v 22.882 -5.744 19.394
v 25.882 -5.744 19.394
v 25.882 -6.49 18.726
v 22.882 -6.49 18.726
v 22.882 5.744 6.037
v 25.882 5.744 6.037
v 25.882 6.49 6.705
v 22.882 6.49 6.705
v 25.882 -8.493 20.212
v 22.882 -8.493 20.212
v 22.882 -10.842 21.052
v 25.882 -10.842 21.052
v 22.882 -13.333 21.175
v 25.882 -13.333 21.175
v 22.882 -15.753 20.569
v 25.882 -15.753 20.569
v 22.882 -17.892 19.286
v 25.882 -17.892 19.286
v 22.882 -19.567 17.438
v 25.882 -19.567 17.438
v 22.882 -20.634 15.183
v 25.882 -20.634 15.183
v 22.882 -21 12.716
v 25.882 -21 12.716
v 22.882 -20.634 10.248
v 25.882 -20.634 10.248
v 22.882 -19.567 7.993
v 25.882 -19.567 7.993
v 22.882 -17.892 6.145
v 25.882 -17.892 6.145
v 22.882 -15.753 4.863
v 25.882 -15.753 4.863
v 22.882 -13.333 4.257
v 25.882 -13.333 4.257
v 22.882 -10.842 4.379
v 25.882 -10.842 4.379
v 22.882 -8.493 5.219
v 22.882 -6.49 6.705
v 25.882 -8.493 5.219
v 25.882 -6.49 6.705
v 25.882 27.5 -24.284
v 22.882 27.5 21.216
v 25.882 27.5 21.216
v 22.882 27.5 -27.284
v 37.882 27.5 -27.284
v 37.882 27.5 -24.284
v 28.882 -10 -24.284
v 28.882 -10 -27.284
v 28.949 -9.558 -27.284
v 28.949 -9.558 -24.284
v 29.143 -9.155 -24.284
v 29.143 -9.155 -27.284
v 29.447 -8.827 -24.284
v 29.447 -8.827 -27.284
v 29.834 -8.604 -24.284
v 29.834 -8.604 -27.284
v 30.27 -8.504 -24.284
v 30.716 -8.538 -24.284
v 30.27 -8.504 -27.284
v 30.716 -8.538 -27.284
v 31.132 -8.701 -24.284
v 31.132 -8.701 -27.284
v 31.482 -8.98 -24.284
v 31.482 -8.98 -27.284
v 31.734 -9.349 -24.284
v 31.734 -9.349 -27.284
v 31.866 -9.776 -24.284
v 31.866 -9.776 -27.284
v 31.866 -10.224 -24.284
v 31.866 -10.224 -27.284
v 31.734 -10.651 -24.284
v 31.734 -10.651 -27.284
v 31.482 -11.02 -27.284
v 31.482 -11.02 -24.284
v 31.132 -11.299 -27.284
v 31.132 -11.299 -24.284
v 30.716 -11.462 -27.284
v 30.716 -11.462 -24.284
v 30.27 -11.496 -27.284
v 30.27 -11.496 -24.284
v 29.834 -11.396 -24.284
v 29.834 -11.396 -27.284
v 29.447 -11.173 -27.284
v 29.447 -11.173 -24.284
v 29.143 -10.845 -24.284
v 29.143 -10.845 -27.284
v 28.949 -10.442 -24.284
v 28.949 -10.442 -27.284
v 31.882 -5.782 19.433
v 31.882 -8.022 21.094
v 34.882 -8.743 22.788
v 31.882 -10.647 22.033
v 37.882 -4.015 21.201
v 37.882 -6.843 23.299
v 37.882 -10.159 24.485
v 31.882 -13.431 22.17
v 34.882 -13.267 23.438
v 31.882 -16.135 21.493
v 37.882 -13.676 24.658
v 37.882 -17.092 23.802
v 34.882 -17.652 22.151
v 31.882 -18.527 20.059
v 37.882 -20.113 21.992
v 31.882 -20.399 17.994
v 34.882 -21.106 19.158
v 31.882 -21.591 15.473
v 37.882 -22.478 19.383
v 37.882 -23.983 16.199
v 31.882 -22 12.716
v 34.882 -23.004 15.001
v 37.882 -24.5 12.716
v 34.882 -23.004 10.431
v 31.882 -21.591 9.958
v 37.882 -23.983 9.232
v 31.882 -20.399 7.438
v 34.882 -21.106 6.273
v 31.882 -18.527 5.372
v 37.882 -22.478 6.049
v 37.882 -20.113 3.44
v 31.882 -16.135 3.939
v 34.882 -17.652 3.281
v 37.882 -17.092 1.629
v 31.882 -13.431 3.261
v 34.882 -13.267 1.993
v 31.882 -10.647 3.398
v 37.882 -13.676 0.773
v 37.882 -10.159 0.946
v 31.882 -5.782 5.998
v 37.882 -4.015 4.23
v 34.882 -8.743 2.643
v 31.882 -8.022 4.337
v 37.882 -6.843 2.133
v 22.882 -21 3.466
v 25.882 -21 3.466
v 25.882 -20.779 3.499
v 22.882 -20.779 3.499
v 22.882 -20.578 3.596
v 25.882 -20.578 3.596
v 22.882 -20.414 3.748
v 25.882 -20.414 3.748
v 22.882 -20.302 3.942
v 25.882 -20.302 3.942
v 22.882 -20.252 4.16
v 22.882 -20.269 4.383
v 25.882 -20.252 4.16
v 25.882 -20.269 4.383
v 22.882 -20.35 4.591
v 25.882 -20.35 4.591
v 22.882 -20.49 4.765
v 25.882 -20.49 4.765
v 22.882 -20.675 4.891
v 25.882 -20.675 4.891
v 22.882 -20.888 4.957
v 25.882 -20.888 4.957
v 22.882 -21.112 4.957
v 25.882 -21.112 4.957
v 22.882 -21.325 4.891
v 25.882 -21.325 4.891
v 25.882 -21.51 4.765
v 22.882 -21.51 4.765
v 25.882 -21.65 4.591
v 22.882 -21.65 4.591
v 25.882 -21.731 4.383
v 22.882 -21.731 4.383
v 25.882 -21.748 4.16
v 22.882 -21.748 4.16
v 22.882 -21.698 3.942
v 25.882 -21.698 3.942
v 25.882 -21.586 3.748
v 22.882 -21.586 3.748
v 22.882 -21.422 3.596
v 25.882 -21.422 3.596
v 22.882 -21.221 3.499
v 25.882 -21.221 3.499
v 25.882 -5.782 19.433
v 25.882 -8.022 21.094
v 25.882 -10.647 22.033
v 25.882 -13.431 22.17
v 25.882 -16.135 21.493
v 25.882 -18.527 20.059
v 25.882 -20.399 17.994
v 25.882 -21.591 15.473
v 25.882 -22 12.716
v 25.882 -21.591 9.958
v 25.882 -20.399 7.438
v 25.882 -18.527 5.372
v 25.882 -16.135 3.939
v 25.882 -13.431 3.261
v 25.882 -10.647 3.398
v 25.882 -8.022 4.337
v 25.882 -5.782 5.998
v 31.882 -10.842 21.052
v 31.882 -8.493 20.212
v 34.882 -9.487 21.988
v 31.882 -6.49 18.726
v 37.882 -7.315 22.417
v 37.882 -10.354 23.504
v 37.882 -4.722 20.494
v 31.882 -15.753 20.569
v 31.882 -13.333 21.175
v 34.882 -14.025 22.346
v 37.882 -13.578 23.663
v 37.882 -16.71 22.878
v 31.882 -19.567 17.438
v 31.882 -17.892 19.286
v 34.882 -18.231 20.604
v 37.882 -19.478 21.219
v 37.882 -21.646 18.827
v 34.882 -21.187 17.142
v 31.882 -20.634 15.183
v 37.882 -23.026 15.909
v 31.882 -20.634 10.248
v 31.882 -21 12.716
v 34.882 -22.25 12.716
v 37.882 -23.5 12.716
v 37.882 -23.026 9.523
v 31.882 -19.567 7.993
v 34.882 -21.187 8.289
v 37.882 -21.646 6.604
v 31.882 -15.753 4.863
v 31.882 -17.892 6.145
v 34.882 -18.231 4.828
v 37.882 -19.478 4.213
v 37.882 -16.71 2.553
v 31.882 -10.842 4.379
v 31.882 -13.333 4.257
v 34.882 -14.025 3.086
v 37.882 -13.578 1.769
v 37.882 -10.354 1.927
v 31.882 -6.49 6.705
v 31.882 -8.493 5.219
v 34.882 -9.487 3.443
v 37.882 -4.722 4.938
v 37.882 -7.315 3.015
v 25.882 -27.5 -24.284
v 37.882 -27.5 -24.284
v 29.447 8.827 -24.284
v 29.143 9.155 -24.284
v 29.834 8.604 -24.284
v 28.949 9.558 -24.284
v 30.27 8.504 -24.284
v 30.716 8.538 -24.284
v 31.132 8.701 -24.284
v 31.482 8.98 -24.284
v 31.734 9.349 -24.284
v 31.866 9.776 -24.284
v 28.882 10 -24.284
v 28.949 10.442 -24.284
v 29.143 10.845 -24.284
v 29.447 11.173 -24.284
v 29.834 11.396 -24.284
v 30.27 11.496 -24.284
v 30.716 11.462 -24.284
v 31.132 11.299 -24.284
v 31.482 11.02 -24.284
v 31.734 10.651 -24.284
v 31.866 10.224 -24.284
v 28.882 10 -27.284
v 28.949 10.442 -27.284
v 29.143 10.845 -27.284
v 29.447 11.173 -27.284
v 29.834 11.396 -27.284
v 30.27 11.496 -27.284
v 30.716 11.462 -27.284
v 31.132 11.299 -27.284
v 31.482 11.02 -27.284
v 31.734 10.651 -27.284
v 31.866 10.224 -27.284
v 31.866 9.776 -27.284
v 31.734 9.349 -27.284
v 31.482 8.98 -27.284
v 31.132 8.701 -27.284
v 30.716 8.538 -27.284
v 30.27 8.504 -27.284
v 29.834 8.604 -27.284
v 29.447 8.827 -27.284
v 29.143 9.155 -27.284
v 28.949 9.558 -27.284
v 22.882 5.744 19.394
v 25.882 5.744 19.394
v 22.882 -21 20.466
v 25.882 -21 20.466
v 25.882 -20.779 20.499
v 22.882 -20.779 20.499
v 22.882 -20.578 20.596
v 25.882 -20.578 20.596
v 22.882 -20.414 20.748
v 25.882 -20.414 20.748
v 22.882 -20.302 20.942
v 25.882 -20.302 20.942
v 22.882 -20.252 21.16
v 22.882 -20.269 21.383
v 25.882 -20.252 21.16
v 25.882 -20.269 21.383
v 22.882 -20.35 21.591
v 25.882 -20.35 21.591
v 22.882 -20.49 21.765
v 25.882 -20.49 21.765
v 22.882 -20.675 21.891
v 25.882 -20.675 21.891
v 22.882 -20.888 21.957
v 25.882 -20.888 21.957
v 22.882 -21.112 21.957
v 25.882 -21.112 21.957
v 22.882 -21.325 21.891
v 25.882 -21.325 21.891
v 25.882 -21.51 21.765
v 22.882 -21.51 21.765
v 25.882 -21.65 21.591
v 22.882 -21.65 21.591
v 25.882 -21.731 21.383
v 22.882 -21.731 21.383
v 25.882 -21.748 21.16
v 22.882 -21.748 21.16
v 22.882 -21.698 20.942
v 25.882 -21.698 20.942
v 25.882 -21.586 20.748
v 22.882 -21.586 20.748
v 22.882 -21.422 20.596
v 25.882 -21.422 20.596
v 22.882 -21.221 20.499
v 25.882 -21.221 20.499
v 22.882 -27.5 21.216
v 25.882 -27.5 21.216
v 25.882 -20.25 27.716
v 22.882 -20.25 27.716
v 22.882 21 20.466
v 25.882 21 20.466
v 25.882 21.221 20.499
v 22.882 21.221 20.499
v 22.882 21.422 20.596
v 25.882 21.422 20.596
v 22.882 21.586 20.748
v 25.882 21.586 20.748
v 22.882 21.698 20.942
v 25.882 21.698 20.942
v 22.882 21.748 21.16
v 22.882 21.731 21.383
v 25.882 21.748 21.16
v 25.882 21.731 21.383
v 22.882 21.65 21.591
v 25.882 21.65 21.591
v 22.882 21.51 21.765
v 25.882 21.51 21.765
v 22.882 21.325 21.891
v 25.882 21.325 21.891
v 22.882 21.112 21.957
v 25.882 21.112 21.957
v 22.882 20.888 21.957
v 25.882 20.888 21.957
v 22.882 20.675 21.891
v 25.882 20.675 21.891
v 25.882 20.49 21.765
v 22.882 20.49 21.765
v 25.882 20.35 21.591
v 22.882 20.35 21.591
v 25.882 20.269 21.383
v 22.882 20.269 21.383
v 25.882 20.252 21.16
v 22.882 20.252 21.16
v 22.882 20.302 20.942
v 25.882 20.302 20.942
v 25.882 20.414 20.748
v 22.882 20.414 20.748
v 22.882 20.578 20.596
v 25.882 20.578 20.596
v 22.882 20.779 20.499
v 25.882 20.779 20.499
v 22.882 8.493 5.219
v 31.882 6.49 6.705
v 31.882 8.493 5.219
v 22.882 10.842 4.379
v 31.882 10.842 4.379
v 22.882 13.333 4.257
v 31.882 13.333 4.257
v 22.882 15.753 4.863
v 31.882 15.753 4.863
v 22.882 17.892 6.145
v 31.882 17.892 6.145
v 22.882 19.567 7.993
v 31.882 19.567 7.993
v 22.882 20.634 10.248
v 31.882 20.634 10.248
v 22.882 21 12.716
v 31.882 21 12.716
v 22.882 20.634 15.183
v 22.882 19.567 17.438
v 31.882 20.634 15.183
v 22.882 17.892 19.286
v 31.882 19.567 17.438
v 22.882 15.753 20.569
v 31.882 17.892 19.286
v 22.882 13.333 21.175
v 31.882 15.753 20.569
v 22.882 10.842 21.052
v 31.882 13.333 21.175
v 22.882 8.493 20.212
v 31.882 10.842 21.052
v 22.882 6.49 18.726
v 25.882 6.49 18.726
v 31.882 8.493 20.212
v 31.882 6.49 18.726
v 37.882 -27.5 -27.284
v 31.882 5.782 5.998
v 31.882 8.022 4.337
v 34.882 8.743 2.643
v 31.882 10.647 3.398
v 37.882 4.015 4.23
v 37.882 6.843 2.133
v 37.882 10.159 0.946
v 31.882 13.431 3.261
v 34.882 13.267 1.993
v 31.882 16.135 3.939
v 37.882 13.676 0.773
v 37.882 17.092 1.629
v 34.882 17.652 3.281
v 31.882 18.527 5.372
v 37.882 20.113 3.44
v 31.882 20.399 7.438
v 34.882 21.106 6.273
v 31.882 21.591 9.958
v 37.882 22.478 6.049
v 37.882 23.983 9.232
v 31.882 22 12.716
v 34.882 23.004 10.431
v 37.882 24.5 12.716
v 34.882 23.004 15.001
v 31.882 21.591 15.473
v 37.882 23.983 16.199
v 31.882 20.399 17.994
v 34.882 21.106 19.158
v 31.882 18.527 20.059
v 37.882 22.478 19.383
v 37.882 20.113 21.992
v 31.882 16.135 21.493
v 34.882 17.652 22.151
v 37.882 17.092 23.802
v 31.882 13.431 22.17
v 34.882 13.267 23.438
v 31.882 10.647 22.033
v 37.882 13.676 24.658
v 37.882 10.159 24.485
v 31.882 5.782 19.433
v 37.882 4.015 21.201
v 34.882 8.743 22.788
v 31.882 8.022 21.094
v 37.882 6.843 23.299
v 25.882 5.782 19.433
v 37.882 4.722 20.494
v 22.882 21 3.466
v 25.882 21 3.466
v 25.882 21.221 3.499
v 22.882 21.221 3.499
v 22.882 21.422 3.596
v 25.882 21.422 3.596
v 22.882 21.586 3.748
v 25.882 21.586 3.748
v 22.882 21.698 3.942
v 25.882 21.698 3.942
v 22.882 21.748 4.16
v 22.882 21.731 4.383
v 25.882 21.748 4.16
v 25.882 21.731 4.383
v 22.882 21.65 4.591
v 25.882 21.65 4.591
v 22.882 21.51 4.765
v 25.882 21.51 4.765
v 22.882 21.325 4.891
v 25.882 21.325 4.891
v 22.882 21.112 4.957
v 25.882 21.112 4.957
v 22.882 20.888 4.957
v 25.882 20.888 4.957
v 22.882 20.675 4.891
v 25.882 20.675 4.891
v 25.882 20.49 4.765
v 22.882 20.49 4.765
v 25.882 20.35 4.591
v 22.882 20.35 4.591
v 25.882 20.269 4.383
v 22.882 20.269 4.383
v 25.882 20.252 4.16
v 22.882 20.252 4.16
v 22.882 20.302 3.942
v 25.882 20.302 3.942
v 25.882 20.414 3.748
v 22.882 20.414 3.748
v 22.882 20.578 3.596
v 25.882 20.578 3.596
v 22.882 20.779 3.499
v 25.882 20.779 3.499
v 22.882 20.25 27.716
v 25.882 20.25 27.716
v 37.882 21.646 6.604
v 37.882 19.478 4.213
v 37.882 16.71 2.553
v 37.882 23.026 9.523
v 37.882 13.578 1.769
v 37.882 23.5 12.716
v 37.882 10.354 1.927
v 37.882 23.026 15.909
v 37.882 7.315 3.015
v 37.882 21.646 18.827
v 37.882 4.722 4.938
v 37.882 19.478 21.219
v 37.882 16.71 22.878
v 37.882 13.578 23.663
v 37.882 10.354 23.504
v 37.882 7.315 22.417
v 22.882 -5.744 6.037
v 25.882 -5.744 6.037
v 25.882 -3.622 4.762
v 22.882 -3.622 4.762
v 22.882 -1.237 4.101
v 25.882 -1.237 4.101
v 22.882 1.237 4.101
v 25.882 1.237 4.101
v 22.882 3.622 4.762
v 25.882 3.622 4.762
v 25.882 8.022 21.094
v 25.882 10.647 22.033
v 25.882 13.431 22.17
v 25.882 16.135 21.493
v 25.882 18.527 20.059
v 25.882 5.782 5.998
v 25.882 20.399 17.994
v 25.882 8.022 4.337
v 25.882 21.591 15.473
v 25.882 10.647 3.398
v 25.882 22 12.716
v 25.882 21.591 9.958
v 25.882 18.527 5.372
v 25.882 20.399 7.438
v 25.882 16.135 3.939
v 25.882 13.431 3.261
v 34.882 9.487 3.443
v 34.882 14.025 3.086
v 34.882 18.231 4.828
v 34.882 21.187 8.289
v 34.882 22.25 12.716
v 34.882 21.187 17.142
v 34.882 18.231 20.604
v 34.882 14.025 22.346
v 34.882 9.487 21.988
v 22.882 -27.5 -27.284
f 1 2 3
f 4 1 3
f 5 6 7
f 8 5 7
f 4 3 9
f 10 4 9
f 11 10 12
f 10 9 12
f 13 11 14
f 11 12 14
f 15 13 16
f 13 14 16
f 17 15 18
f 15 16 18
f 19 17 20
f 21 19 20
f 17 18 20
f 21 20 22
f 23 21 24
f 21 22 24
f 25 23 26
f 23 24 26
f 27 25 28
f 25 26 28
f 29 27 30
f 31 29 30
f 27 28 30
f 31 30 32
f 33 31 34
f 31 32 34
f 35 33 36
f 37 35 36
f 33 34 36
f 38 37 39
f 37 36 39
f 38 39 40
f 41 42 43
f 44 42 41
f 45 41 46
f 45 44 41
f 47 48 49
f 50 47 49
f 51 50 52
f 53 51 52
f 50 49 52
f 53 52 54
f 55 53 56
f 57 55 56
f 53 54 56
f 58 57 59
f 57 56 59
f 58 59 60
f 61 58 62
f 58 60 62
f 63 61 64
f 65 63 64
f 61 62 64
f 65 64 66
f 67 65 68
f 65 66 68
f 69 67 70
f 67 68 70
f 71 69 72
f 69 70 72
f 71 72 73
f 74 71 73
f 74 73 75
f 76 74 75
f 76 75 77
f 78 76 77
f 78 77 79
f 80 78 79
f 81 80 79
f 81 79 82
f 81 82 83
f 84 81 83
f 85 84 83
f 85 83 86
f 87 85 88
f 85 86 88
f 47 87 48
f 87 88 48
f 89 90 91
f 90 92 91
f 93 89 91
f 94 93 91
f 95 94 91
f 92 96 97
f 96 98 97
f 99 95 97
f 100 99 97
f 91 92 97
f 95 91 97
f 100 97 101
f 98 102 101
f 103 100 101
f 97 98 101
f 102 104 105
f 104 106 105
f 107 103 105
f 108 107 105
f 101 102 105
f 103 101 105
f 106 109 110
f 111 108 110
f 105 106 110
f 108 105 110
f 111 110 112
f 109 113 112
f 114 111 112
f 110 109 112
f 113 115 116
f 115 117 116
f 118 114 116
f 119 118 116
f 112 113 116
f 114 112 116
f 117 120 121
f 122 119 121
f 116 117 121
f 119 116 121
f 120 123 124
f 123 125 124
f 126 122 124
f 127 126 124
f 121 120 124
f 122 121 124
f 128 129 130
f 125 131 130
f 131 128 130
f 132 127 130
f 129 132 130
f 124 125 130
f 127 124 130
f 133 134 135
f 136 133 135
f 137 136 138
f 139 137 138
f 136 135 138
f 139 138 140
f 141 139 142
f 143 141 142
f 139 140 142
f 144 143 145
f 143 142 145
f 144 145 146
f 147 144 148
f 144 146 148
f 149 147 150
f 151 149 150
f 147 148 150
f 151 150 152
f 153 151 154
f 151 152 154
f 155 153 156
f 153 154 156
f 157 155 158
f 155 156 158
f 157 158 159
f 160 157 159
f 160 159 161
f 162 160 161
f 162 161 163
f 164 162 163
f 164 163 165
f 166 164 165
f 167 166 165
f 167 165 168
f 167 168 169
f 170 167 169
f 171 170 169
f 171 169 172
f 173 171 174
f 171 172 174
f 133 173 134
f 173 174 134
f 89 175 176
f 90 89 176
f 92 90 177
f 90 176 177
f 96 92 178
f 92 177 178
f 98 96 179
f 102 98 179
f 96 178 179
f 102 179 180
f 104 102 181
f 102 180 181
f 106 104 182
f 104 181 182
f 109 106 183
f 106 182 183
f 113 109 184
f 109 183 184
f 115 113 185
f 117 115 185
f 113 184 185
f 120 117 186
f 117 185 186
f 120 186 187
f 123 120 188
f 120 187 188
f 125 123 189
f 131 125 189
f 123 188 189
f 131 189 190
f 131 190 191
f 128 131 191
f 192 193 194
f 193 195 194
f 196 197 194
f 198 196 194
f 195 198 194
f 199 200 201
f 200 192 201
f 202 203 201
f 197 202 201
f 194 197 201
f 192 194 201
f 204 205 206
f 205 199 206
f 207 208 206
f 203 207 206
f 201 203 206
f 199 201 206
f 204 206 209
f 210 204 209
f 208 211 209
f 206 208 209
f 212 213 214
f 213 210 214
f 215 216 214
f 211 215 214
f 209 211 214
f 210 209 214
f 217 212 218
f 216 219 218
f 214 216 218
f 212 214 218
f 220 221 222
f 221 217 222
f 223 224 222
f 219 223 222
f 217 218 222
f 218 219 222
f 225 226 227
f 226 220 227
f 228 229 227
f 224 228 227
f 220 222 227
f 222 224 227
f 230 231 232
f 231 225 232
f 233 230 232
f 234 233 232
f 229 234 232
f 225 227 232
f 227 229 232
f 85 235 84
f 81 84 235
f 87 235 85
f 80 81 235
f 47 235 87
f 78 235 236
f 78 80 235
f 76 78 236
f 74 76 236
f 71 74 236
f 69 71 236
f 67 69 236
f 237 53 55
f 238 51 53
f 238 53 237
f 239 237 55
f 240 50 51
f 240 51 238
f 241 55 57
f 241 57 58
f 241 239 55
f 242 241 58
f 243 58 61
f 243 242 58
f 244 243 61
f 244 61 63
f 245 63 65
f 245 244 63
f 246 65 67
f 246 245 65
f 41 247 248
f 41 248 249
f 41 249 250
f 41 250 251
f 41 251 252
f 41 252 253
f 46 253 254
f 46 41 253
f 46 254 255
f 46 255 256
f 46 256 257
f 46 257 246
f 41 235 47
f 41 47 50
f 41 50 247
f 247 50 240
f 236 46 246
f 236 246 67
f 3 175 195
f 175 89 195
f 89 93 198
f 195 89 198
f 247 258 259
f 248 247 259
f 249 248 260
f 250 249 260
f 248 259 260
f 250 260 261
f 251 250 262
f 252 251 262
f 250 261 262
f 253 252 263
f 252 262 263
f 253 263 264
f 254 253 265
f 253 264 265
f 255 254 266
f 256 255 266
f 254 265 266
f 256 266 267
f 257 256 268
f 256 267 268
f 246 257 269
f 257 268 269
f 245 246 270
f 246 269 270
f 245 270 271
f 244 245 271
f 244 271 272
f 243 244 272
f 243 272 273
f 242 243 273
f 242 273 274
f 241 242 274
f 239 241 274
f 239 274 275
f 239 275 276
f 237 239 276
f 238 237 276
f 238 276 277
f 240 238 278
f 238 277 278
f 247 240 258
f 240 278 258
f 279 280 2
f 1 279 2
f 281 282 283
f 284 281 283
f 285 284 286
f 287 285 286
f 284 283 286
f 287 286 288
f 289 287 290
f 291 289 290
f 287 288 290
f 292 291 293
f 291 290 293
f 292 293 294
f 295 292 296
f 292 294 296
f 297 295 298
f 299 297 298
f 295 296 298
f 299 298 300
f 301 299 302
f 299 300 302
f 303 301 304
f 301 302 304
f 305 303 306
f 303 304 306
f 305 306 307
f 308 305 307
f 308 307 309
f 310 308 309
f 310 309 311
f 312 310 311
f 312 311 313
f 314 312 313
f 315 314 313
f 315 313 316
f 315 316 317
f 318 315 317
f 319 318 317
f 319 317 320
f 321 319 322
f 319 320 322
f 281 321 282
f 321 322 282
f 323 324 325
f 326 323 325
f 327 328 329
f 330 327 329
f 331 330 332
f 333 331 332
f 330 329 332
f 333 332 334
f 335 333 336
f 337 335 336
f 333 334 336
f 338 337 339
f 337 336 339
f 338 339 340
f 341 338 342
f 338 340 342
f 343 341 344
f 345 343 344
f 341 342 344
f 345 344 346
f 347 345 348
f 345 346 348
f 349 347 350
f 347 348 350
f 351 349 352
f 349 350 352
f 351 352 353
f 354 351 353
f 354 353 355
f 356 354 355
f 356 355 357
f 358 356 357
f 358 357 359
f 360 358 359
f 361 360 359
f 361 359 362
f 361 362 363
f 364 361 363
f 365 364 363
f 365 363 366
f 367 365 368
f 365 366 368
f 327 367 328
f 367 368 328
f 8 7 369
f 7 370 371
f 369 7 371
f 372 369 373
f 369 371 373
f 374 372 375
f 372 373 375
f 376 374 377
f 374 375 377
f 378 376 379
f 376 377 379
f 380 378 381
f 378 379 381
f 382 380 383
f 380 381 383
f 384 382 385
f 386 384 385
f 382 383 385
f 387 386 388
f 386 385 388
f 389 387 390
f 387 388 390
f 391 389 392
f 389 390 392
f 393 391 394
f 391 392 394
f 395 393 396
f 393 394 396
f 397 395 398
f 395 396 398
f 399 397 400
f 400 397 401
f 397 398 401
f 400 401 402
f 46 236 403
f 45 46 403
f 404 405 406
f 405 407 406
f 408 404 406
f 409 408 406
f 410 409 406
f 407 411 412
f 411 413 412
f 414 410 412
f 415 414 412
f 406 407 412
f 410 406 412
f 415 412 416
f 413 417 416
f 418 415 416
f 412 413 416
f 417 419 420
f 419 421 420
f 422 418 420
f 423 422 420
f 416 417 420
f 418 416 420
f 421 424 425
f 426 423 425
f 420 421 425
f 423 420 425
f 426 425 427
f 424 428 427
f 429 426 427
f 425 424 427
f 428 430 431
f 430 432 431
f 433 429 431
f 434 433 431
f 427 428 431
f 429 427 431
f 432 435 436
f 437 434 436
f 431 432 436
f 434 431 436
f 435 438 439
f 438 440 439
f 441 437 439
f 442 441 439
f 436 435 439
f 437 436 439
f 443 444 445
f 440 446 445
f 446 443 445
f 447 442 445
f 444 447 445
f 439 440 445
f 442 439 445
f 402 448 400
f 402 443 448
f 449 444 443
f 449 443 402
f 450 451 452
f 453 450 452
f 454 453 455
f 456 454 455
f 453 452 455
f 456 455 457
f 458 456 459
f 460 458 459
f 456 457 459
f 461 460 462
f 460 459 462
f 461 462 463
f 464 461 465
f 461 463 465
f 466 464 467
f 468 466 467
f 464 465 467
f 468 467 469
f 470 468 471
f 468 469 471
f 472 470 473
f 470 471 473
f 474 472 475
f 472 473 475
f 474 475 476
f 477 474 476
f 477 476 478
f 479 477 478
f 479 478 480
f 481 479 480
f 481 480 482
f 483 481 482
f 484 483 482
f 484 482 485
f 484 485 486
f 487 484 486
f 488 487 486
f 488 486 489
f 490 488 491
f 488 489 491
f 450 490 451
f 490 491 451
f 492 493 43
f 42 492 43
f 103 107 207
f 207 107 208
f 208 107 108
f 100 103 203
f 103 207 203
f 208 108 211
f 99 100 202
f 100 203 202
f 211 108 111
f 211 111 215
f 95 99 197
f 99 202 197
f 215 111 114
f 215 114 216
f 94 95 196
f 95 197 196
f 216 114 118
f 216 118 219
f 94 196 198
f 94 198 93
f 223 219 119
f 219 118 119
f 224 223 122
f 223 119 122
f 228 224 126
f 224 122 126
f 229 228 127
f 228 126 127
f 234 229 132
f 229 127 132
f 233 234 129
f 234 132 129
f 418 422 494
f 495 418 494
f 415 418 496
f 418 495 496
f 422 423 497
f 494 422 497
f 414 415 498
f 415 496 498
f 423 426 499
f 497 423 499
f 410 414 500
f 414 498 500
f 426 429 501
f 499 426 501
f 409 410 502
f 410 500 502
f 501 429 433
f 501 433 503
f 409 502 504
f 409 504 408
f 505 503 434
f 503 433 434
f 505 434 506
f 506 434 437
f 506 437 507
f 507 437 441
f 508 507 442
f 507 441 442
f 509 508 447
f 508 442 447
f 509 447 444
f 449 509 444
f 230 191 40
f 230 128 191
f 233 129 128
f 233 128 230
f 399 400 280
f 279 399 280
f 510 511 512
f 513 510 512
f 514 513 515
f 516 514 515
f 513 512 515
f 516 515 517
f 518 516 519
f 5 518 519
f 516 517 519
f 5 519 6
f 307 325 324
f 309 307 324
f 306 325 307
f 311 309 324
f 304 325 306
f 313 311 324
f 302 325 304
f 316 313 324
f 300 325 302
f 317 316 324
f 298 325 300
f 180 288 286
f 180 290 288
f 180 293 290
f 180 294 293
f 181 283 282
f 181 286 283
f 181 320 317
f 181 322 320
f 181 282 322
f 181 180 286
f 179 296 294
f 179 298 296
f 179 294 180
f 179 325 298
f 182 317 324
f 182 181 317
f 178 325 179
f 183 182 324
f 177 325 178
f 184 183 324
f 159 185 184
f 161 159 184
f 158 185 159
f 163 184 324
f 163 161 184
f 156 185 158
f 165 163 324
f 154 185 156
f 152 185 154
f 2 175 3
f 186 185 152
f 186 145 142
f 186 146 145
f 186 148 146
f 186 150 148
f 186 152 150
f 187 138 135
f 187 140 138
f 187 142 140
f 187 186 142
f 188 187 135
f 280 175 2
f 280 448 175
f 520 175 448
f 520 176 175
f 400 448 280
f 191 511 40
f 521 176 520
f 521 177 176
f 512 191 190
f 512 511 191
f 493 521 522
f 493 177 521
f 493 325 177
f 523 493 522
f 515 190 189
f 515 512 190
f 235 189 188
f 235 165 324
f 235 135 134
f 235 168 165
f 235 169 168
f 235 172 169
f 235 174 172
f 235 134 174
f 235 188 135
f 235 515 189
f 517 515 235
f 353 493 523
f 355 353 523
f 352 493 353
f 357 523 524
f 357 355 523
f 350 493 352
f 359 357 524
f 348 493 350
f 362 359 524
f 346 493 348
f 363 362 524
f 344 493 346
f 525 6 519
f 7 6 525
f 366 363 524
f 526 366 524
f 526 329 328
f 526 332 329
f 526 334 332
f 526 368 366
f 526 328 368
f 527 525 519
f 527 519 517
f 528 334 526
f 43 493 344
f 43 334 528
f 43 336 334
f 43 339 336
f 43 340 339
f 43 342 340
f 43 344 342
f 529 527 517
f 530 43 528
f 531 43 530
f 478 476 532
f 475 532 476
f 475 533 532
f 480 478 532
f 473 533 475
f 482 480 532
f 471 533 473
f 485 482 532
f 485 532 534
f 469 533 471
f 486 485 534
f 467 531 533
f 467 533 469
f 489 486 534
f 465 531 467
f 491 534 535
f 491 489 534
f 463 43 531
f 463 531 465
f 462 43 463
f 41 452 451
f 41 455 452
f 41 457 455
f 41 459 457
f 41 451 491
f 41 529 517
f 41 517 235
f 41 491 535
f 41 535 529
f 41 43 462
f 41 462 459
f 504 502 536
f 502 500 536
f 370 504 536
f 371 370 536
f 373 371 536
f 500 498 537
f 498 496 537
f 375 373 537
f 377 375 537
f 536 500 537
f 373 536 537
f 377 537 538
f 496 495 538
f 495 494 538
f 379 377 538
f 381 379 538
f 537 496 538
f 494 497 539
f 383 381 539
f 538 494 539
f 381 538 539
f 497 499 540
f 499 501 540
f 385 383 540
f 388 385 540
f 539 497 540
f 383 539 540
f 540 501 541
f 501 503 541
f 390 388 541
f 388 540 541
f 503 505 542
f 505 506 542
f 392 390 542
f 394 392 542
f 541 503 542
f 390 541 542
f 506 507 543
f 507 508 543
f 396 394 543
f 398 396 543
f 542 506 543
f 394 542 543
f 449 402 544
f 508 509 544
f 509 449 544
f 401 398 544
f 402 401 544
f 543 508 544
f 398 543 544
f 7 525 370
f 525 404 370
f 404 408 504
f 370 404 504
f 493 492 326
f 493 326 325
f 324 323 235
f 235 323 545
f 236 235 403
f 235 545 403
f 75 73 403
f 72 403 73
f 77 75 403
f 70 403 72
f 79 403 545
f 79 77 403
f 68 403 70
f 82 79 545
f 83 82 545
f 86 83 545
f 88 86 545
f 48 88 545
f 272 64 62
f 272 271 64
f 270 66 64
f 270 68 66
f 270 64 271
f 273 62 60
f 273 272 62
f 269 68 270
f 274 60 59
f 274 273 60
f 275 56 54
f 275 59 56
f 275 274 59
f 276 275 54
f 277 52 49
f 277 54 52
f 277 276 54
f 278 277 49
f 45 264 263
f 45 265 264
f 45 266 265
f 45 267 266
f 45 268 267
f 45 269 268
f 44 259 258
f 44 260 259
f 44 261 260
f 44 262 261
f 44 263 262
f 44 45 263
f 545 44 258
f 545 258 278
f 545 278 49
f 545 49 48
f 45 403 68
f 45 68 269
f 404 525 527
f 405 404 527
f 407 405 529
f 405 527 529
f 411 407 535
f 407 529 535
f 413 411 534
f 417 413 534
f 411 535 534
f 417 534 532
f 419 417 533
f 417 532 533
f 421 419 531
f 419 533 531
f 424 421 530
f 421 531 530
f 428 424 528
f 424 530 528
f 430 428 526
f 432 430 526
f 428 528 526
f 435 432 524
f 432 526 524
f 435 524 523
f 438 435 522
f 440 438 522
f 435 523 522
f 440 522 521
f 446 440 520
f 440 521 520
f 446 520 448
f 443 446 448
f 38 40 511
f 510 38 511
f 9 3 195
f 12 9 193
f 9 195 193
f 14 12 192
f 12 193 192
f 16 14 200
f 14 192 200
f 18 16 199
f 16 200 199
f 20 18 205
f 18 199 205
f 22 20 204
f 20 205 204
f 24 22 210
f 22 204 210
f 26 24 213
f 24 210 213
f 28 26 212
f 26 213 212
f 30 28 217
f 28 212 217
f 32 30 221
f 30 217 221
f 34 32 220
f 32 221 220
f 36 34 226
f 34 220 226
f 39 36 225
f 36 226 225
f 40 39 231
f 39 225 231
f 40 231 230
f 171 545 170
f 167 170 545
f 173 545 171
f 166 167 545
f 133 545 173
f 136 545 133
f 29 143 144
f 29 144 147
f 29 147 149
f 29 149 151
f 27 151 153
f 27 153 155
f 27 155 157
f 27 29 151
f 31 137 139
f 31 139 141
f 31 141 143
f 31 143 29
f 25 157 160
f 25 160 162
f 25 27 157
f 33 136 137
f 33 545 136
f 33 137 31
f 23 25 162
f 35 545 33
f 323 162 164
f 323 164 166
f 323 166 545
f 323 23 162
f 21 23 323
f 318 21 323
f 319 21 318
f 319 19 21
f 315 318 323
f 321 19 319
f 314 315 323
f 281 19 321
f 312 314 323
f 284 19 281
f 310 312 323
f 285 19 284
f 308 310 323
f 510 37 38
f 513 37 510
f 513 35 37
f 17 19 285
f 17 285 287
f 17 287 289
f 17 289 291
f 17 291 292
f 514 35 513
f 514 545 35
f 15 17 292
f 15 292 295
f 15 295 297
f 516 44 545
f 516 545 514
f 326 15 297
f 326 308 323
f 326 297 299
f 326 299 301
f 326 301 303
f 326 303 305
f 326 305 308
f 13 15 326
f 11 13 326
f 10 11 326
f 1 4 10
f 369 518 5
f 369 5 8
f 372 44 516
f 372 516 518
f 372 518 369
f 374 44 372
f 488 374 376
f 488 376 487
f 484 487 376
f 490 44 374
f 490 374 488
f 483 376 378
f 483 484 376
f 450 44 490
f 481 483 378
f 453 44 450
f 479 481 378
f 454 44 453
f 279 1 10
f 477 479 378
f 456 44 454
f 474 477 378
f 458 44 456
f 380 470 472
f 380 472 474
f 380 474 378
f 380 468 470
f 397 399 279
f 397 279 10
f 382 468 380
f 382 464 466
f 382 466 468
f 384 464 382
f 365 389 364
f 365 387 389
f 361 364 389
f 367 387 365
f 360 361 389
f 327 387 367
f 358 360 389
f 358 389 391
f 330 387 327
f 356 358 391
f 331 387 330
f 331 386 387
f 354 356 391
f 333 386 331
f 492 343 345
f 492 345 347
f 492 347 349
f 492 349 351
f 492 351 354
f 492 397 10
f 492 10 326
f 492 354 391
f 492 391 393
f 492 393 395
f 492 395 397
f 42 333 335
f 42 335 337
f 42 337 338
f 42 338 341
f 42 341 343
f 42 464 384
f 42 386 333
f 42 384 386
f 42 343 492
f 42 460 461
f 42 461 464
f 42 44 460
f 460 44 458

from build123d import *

# Parameters (mm, degrees)
EXTRUDE_1_DEPTH     = 27.5
SKETCH_3_R          = 0.75
CUT_EXTRUDE_3_DEPTH = 3
REVOLVE_1_ANGLE     = 270
SKETCH_2_R          = 1.5
CUT_EXTRUDE_4_DEPTH = 3


with BuildPart() as part:
    # 草图1 → 凸台-拉伸1 (new, symmetric)
    with BuildSketch(Plane(origin=(0, 0, 0), x_dir=(1, 0, 0), z_dir=(0, 1, 0))):
        Polygon((22.882352941, -27.715686275), (25.882352941, -27.715686275), (25.882352941, 24.284313725), (37.882352941, 24.284313725), (37.882352941, 27.284313725), (22.882352941, 27.284313725), align=None)
    extrude(amount=EXTRUDE_1_DEPTH, both=True)

    # 草图3 → 切除-拉伸3 (cut)
    with BuildSketch(Plane(origin=(25.882352941, 0, 0), x_dir=(0, 0, -1), z_dir=(1, 0, 0))):
        with BuildLine():
            Line((-19.394463571, 5.743970558), (-19.394463571, -5.743970558))
            Line((-19.394463571, -5.743970558), (-18.726093915, -6.48959236))
            ThreePointArc((-18.726093915, -6.48959236), (-12.715686275, -21), (-6.705278634, -6.48959236))
            Line((-6.705278634, -6.48959236), (-6.036908978, -5.743970558))
            ThreePointArc((-6.036908978, -5.743970558), (-4.017201465, 0), (-6.036908978, 5.743970558))
            Line((-6.036908978, 5.743970558), (-6.705278634, 6.48959236))
            ThreePointArc((-6.705278634, 6.48959236), (-12.715686275, 21), (-18.726093915, 6.48959236))
            Line((-18.726093915, 6.48959236), (-19.394463571, 5.743970558))
        make_face()
        Polygon((-21.215686275, 27.5), (-27.715686275, 27.5), (-27.715686275, 20.24982538), align=None)
        Polygon((-21.215686275, -27.5), (-27.715686275, -20.24982538), (-27.715686275, -27.5), align=None)
        with Locations((-4.215686275, -21)):
            Circle(SKETCH_3_R)
        with Locations((-21.215686275, -21)):
            Circle(SKETCH_3_R)
        with Locations((-4.215686275, 21)):
            Circle(SKETCH_3_R)
        with Locations((-21.215686275, 21)):
            Circle(SKETCH_3_R)
    extrude(amount=-CUT_EXTRUDE_3_DEPTH, mode=Mode.SUBTRACT)

    # 草图5 → 旋转1 (revolve, symmetric)
    with BuildSketch(Plane(origin=(0, 0, 12.715686275), x_dir=(0, -1, 0), z_dir=(0, 0, 1))) as revolve_1_sk:
        Polygon((-22, 25.882352941), (-21, 25.882352941), (-21, 31.882352941), (-23.5, 37.882352941), (-24.5, 37.882352941), (-22, 31.882352941), align=None)
    revolve_1 = revolve(axis=Axis((32.882352941, 12.5, 12.715686275), (-1, 0, 0)), revolution_arc=REVOLVE_1_ANGLE / 2)
    revolve_1 = revolve_1 + revolve(revolve_1_sk.sketch, axis=Axis((32.882352941, 12.5, 12.715686275), (1, 0, 0)), revolution_arc=REVOLVE_1_ANGLE / 2)

    # 镜向1: 旋转1 across plane
    add(revolve_1.mirror(Plane.ZX))

    # 草图2 → 切除-拉伸4 (cut)
    with BuildSketch(Plane(origin=(0, 0, -27.284313725), x_dir=(-1, 0, 0), z_dir=(0, 0, -1))):
        with Locations((-30.382352941, 10)):
            Circle(SKETCH_2_R)
        with Locations((-30.382352941, -10)):
            Circle(SKETCH_2_R)
    extrude(amount=-CUT_EXTRUDE_4_DEPTH, mode=Mode.SUBTRACT)


solid = part.part
